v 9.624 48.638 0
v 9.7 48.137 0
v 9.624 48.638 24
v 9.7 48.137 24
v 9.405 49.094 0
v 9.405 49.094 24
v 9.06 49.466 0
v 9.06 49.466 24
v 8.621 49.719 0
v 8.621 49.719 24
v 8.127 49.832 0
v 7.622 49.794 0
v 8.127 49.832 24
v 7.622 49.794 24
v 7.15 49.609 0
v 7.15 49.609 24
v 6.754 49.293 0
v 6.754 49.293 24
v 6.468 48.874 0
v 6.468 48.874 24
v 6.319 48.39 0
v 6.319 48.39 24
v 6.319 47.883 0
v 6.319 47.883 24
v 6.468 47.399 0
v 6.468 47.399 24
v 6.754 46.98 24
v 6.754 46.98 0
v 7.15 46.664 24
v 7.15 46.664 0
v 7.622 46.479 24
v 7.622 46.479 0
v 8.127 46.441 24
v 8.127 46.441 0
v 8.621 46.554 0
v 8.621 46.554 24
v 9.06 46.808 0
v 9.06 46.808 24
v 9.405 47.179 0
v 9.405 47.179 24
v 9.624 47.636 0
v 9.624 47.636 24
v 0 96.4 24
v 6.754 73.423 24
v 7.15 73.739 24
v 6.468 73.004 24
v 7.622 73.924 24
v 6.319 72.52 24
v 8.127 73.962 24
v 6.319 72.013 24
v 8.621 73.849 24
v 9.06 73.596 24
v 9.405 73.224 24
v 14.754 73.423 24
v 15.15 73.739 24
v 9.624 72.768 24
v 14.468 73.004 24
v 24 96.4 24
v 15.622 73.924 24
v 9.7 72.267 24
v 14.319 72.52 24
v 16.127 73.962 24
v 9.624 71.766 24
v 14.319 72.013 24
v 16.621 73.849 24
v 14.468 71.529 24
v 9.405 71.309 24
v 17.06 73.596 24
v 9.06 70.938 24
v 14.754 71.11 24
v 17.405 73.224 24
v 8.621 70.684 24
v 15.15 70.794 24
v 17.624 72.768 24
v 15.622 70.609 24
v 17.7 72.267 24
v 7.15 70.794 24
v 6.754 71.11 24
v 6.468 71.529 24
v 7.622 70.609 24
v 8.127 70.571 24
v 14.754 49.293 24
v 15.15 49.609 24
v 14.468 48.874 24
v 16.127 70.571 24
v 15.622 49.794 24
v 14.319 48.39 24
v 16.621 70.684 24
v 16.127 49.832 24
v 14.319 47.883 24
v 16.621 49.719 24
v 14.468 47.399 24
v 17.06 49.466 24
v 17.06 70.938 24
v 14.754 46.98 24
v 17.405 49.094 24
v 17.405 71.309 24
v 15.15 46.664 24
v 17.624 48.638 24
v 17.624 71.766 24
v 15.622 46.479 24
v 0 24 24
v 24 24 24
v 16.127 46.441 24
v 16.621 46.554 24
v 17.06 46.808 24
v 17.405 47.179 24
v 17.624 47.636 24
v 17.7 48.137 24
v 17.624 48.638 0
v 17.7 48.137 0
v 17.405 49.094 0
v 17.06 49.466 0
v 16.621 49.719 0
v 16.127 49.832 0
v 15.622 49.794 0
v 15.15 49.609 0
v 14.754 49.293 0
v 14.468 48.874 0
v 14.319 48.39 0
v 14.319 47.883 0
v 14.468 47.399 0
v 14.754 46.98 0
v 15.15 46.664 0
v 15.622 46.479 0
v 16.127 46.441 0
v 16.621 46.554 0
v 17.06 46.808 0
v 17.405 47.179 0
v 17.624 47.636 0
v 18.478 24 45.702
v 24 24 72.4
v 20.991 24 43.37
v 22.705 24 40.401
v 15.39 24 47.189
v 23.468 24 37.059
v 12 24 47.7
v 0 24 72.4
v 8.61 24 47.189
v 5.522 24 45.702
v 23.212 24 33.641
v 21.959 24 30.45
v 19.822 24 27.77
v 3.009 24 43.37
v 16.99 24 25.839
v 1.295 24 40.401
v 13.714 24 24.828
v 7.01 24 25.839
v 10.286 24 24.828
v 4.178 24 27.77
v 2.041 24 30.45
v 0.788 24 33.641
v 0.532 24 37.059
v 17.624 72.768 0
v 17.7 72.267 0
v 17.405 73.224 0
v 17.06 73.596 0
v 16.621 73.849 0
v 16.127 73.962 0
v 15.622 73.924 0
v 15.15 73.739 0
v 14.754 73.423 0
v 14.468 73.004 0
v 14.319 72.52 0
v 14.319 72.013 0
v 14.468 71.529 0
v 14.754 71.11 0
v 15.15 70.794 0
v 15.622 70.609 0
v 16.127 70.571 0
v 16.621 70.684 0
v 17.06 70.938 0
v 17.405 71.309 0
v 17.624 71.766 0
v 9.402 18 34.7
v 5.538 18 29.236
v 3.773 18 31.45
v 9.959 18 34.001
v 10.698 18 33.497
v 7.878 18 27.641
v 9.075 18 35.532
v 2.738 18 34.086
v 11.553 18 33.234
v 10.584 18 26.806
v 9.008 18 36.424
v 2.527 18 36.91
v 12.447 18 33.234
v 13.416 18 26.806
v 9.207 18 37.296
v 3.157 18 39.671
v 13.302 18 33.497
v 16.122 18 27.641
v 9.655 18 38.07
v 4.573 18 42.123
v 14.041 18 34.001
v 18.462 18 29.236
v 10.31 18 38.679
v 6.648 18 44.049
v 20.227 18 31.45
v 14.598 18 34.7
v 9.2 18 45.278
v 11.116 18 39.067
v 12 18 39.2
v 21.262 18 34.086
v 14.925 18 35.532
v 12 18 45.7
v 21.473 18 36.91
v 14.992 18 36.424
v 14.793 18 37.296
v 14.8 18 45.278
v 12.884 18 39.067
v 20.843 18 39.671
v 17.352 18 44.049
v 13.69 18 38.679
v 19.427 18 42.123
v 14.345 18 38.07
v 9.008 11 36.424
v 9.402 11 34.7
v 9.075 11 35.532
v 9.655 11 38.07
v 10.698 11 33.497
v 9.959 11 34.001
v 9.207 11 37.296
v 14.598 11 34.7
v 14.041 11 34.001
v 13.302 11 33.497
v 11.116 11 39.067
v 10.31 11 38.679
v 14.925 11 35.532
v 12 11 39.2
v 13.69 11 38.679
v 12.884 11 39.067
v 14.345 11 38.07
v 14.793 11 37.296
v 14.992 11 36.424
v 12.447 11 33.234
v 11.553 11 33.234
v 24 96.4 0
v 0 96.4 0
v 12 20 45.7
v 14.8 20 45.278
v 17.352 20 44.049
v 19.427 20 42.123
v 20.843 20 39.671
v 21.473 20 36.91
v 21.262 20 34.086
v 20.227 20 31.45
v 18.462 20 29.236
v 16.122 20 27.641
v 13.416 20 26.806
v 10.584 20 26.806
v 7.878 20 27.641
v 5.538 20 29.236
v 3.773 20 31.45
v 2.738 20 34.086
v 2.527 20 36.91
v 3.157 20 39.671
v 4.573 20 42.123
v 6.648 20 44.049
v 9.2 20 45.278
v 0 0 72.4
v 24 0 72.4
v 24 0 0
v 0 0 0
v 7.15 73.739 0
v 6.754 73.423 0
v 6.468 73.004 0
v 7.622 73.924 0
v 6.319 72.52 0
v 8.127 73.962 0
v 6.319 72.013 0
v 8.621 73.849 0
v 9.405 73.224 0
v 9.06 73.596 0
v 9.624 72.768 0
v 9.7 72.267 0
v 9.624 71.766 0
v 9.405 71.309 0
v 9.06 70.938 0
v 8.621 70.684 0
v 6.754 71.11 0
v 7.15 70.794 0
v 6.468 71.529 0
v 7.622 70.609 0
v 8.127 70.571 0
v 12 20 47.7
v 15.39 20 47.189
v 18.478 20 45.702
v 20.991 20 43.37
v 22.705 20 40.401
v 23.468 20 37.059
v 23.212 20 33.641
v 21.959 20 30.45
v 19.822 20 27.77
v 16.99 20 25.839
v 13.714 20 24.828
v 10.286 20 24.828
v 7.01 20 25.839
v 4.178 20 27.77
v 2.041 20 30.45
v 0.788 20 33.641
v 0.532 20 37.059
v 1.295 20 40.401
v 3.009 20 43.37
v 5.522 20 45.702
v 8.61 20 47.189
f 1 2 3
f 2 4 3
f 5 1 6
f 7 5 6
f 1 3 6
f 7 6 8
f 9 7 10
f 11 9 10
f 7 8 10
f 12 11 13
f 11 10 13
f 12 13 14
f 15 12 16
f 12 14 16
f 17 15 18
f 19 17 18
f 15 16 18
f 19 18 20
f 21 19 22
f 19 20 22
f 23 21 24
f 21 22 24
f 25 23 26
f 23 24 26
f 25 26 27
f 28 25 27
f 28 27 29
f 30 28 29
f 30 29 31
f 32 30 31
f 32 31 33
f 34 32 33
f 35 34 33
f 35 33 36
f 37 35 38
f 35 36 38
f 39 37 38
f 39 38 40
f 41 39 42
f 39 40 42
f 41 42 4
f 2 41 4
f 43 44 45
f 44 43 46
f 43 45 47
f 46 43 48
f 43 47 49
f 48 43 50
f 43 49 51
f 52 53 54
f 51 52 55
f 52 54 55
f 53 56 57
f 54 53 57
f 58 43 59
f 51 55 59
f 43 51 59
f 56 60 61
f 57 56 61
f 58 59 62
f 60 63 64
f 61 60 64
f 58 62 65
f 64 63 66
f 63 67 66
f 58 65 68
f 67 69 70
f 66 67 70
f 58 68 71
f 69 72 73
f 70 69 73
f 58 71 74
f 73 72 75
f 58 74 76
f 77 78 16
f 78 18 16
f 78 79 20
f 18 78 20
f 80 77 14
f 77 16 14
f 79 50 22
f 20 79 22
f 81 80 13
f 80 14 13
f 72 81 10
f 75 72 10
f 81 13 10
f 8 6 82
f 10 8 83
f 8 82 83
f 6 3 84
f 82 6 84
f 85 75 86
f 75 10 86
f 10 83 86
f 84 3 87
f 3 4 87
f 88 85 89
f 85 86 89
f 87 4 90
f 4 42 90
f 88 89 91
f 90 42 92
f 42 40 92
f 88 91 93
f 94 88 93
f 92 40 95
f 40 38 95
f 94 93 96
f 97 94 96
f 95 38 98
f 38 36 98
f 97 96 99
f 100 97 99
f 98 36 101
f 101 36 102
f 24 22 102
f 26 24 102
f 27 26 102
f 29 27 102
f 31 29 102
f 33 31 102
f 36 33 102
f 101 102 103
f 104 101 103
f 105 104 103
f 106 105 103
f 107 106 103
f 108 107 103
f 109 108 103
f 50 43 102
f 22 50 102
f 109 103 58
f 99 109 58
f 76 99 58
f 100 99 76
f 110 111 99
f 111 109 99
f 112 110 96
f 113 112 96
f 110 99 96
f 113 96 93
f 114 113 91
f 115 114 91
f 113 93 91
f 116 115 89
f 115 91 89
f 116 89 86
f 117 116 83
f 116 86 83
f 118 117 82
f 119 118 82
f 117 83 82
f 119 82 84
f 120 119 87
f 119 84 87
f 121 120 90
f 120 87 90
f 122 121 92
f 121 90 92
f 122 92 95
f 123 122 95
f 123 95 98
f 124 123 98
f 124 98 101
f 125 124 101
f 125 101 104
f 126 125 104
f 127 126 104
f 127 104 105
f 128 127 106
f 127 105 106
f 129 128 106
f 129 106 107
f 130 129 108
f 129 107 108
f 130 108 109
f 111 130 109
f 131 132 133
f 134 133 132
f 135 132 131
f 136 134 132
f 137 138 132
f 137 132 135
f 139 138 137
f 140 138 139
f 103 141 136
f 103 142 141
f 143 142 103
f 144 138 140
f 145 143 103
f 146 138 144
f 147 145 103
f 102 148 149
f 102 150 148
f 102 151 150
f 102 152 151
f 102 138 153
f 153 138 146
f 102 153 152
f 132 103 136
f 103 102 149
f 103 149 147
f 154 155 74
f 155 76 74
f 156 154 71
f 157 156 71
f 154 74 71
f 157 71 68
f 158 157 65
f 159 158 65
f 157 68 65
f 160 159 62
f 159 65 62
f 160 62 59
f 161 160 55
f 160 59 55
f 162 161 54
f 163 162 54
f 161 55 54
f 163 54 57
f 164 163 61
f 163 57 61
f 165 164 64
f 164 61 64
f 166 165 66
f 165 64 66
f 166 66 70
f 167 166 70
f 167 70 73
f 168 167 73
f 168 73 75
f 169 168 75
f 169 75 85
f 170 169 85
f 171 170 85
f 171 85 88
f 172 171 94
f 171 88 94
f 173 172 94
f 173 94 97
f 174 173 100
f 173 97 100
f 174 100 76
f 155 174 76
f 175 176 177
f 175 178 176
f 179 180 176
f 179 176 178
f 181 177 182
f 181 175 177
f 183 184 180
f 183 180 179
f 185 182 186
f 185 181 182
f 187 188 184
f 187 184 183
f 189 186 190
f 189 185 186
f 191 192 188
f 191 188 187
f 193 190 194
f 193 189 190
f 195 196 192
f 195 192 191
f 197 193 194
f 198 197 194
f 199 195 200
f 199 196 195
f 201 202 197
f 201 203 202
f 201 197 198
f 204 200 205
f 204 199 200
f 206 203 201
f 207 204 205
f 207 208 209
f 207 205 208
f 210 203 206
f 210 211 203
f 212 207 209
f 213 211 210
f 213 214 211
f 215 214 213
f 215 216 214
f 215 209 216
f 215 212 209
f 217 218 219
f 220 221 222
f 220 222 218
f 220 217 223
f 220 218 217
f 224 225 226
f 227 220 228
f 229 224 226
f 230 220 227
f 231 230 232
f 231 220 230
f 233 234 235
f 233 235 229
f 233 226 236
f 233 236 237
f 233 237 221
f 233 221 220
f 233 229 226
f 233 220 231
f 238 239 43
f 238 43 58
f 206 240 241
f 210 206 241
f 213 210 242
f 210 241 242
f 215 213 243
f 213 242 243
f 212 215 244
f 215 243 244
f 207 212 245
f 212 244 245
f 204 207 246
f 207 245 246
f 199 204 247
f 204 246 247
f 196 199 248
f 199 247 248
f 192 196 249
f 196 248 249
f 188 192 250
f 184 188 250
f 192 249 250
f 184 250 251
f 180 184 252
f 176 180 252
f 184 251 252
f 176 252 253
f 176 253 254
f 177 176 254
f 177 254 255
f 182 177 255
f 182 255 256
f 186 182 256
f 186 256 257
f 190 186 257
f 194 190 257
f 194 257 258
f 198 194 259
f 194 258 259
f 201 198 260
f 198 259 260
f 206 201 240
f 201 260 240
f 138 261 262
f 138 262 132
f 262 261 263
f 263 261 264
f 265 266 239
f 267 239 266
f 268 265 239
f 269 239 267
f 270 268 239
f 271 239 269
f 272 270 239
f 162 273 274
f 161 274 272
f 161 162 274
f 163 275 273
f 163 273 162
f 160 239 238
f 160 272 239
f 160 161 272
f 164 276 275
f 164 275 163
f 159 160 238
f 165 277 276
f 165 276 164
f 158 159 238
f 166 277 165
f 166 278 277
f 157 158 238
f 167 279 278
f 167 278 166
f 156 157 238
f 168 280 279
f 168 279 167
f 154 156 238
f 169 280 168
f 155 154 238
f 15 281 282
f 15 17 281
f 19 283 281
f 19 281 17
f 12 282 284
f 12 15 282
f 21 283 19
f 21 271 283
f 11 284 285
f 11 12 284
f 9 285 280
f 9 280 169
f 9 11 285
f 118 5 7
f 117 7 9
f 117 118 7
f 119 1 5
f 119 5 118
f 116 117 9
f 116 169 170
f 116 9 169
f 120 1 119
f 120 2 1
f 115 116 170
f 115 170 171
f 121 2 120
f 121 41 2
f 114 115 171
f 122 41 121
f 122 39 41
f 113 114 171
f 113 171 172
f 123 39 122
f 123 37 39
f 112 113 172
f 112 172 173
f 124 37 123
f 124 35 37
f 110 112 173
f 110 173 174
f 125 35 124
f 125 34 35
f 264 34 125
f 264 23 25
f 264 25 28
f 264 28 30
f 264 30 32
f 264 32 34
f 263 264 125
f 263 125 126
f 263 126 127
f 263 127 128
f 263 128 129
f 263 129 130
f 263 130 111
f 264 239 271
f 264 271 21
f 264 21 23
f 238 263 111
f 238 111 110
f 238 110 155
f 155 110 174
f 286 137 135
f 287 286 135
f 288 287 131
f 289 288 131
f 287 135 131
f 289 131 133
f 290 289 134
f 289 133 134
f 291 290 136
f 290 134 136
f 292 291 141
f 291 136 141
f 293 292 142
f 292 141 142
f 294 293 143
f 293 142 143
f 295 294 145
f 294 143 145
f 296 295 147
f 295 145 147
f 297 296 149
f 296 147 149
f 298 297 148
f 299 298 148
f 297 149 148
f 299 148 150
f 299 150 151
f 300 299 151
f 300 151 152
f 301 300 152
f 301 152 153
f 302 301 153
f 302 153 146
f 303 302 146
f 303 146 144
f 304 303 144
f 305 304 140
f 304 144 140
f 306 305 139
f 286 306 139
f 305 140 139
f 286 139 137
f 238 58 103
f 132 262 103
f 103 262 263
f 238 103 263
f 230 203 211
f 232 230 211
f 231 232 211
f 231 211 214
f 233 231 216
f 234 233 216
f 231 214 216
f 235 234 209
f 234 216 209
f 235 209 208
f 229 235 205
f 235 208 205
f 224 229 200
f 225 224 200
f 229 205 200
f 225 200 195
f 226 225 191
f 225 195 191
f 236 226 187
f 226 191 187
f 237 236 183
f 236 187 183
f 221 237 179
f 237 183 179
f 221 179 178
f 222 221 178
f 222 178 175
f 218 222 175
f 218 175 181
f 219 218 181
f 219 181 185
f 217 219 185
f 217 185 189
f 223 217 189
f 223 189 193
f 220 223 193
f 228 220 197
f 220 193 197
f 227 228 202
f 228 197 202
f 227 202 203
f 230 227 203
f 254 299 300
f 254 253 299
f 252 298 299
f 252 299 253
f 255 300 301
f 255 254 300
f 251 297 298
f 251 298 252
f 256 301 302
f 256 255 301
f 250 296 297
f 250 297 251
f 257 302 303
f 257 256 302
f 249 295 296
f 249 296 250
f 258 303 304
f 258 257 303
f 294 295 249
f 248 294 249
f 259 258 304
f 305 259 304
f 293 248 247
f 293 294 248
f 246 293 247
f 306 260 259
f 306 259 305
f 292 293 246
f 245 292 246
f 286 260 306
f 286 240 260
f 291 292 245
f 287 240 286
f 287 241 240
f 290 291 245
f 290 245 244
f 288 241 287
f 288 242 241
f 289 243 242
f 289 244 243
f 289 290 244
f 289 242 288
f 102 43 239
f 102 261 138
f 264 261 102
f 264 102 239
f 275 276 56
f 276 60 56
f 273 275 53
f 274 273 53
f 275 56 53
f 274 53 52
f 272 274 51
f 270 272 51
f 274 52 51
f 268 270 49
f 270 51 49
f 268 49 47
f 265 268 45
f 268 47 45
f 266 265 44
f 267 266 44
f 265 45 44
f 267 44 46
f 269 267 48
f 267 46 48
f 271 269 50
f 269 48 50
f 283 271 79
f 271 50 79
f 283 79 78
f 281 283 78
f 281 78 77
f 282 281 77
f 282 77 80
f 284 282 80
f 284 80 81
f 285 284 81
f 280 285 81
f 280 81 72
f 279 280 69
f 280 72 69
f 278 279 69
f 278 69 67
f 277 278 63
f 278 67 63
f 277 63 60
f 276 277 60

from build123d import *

# Parameters (mm, degrees)
SKETCH2_W            = 72.4
SKETCH2_H            = 24
BOSS_EXTRUDE3_DEPTH  = 24
SKETCH5_W            = 24
SKETCH5_H            = 24
BOSS_EXTRUDE4_DEPTH  = 72.4
SKETCH6_R            = 1.7
CUT_EXTRUDE2_DEPTH   = 111.505746457
LPATTERN1_COUNT      = 2
LPATTERN1_PITCH      = 8
LPATTERN1_COUNT_DIR2 = 2
LPATTERN1_PITCH_DIR2 = 24.13
SKETCH7_R            = 11.5
CUT_EXTRUDE3_DEPTH   = 4
SKETCH8_R            = 9.5
CUT_EXTRUDE4_DEPTH   = 2
SKETCH9_R            = 3
CUT_EXTRUDE5_DEPTH   = 7


with BuildPart() as part:
    # Sketch2 → Boss-Extrude3 (new body)
    with BuildSketch(Plane(origin=(0, 0, 0), x_dir=(0, 0, -1), z_dir=(1, 0, 0))):
        with Locations((-36.2, 12)):
            Rectangle(SKETCH2_W, SKETCH2_H)
    extrude(amount=BOSS_EXTRUDE3_DEPTH)

    # Sketch5 → Boss-Extrude4 (add)
    with BuildSketch(Plane(origin=(0, 24, 0), x_dir=(1, 0, 0), z_dir=(0, 1, 0))):
        with Locations((12, -12)):
            Rectangle(SKETCH5_W, SKETCH5_H)
    extrude(amount=BOSS_EXTRUDE4_DEPTH)

    # Sketch6 → Cut-Extrude2 (cut, symmetric)
    with BuildSketch(Plane.XY.offset(24)):
        with Locations((8, 72.266666667)):
            Circle(SKETCH6_R)
    cut_extrude2 = extrude(amount=CUT_EXTRUDE2_DEPTH, both=True, mode=Mode.SUBTRACT)

    # LPattern1: Cut-Extrude2 2 × 2
    with Locations(*[(i * LPATTERN1_PITCH, -j * LPATTERN1_PITCH_DIR2, 0) for i in range(LPATTERN1_COUNT) for j in range(LPATTERN1_COUNT_DIR2) if (i, j) != (0, 0)]):
        add(cut_extrude2, mode=Mode.SUBTRACT)

    # Sketch7 → Cut-Extrude3 (cut)
    with BuildSketch(Plane(origin=(0, 24, 0), x_dir=(1, 0, 0), z_dir=(0, 1, 0))):
        with Locations(Location((12, -36.2, 0), (0, 0, 270))):
            Circle(SKETCH7_R)
    extrude(amount=-CUT_EXTRUDE3_DEPTH, mode=Mode.SUBTRACT)

    # Sketch8 → Cut-Extrude4 (cut)
    with BuildSketch(Plane(origin=(0, 20, 0), x_dir=(1, 0, 0), z_dir=(0, 1, 0))):
        with Locations(Location((12, -36.2, 0), (0, 0, 270))):
            Circle(SKETCH8_R)
    extrude(amount=-CUT_EXTRUDE4_DEPTH, mode=Mode.SUBTRACT)

    # Sketch9 → Cut-Extrude5 (cut)
    with BuildSketch(Plane(origin=(0, 18, 0), x_dir=(1, 0, 0), z_dir=(0, 1, 0))):
        with Locations(Location((12, -36.2, 0), (0, 0, 270))):
            Circle(SKETCH9_R)
    extrude(amount=-CUT_EXTRUDE5_DEPTH, mode=Mode.SUBTRACT)


solid = part.part
